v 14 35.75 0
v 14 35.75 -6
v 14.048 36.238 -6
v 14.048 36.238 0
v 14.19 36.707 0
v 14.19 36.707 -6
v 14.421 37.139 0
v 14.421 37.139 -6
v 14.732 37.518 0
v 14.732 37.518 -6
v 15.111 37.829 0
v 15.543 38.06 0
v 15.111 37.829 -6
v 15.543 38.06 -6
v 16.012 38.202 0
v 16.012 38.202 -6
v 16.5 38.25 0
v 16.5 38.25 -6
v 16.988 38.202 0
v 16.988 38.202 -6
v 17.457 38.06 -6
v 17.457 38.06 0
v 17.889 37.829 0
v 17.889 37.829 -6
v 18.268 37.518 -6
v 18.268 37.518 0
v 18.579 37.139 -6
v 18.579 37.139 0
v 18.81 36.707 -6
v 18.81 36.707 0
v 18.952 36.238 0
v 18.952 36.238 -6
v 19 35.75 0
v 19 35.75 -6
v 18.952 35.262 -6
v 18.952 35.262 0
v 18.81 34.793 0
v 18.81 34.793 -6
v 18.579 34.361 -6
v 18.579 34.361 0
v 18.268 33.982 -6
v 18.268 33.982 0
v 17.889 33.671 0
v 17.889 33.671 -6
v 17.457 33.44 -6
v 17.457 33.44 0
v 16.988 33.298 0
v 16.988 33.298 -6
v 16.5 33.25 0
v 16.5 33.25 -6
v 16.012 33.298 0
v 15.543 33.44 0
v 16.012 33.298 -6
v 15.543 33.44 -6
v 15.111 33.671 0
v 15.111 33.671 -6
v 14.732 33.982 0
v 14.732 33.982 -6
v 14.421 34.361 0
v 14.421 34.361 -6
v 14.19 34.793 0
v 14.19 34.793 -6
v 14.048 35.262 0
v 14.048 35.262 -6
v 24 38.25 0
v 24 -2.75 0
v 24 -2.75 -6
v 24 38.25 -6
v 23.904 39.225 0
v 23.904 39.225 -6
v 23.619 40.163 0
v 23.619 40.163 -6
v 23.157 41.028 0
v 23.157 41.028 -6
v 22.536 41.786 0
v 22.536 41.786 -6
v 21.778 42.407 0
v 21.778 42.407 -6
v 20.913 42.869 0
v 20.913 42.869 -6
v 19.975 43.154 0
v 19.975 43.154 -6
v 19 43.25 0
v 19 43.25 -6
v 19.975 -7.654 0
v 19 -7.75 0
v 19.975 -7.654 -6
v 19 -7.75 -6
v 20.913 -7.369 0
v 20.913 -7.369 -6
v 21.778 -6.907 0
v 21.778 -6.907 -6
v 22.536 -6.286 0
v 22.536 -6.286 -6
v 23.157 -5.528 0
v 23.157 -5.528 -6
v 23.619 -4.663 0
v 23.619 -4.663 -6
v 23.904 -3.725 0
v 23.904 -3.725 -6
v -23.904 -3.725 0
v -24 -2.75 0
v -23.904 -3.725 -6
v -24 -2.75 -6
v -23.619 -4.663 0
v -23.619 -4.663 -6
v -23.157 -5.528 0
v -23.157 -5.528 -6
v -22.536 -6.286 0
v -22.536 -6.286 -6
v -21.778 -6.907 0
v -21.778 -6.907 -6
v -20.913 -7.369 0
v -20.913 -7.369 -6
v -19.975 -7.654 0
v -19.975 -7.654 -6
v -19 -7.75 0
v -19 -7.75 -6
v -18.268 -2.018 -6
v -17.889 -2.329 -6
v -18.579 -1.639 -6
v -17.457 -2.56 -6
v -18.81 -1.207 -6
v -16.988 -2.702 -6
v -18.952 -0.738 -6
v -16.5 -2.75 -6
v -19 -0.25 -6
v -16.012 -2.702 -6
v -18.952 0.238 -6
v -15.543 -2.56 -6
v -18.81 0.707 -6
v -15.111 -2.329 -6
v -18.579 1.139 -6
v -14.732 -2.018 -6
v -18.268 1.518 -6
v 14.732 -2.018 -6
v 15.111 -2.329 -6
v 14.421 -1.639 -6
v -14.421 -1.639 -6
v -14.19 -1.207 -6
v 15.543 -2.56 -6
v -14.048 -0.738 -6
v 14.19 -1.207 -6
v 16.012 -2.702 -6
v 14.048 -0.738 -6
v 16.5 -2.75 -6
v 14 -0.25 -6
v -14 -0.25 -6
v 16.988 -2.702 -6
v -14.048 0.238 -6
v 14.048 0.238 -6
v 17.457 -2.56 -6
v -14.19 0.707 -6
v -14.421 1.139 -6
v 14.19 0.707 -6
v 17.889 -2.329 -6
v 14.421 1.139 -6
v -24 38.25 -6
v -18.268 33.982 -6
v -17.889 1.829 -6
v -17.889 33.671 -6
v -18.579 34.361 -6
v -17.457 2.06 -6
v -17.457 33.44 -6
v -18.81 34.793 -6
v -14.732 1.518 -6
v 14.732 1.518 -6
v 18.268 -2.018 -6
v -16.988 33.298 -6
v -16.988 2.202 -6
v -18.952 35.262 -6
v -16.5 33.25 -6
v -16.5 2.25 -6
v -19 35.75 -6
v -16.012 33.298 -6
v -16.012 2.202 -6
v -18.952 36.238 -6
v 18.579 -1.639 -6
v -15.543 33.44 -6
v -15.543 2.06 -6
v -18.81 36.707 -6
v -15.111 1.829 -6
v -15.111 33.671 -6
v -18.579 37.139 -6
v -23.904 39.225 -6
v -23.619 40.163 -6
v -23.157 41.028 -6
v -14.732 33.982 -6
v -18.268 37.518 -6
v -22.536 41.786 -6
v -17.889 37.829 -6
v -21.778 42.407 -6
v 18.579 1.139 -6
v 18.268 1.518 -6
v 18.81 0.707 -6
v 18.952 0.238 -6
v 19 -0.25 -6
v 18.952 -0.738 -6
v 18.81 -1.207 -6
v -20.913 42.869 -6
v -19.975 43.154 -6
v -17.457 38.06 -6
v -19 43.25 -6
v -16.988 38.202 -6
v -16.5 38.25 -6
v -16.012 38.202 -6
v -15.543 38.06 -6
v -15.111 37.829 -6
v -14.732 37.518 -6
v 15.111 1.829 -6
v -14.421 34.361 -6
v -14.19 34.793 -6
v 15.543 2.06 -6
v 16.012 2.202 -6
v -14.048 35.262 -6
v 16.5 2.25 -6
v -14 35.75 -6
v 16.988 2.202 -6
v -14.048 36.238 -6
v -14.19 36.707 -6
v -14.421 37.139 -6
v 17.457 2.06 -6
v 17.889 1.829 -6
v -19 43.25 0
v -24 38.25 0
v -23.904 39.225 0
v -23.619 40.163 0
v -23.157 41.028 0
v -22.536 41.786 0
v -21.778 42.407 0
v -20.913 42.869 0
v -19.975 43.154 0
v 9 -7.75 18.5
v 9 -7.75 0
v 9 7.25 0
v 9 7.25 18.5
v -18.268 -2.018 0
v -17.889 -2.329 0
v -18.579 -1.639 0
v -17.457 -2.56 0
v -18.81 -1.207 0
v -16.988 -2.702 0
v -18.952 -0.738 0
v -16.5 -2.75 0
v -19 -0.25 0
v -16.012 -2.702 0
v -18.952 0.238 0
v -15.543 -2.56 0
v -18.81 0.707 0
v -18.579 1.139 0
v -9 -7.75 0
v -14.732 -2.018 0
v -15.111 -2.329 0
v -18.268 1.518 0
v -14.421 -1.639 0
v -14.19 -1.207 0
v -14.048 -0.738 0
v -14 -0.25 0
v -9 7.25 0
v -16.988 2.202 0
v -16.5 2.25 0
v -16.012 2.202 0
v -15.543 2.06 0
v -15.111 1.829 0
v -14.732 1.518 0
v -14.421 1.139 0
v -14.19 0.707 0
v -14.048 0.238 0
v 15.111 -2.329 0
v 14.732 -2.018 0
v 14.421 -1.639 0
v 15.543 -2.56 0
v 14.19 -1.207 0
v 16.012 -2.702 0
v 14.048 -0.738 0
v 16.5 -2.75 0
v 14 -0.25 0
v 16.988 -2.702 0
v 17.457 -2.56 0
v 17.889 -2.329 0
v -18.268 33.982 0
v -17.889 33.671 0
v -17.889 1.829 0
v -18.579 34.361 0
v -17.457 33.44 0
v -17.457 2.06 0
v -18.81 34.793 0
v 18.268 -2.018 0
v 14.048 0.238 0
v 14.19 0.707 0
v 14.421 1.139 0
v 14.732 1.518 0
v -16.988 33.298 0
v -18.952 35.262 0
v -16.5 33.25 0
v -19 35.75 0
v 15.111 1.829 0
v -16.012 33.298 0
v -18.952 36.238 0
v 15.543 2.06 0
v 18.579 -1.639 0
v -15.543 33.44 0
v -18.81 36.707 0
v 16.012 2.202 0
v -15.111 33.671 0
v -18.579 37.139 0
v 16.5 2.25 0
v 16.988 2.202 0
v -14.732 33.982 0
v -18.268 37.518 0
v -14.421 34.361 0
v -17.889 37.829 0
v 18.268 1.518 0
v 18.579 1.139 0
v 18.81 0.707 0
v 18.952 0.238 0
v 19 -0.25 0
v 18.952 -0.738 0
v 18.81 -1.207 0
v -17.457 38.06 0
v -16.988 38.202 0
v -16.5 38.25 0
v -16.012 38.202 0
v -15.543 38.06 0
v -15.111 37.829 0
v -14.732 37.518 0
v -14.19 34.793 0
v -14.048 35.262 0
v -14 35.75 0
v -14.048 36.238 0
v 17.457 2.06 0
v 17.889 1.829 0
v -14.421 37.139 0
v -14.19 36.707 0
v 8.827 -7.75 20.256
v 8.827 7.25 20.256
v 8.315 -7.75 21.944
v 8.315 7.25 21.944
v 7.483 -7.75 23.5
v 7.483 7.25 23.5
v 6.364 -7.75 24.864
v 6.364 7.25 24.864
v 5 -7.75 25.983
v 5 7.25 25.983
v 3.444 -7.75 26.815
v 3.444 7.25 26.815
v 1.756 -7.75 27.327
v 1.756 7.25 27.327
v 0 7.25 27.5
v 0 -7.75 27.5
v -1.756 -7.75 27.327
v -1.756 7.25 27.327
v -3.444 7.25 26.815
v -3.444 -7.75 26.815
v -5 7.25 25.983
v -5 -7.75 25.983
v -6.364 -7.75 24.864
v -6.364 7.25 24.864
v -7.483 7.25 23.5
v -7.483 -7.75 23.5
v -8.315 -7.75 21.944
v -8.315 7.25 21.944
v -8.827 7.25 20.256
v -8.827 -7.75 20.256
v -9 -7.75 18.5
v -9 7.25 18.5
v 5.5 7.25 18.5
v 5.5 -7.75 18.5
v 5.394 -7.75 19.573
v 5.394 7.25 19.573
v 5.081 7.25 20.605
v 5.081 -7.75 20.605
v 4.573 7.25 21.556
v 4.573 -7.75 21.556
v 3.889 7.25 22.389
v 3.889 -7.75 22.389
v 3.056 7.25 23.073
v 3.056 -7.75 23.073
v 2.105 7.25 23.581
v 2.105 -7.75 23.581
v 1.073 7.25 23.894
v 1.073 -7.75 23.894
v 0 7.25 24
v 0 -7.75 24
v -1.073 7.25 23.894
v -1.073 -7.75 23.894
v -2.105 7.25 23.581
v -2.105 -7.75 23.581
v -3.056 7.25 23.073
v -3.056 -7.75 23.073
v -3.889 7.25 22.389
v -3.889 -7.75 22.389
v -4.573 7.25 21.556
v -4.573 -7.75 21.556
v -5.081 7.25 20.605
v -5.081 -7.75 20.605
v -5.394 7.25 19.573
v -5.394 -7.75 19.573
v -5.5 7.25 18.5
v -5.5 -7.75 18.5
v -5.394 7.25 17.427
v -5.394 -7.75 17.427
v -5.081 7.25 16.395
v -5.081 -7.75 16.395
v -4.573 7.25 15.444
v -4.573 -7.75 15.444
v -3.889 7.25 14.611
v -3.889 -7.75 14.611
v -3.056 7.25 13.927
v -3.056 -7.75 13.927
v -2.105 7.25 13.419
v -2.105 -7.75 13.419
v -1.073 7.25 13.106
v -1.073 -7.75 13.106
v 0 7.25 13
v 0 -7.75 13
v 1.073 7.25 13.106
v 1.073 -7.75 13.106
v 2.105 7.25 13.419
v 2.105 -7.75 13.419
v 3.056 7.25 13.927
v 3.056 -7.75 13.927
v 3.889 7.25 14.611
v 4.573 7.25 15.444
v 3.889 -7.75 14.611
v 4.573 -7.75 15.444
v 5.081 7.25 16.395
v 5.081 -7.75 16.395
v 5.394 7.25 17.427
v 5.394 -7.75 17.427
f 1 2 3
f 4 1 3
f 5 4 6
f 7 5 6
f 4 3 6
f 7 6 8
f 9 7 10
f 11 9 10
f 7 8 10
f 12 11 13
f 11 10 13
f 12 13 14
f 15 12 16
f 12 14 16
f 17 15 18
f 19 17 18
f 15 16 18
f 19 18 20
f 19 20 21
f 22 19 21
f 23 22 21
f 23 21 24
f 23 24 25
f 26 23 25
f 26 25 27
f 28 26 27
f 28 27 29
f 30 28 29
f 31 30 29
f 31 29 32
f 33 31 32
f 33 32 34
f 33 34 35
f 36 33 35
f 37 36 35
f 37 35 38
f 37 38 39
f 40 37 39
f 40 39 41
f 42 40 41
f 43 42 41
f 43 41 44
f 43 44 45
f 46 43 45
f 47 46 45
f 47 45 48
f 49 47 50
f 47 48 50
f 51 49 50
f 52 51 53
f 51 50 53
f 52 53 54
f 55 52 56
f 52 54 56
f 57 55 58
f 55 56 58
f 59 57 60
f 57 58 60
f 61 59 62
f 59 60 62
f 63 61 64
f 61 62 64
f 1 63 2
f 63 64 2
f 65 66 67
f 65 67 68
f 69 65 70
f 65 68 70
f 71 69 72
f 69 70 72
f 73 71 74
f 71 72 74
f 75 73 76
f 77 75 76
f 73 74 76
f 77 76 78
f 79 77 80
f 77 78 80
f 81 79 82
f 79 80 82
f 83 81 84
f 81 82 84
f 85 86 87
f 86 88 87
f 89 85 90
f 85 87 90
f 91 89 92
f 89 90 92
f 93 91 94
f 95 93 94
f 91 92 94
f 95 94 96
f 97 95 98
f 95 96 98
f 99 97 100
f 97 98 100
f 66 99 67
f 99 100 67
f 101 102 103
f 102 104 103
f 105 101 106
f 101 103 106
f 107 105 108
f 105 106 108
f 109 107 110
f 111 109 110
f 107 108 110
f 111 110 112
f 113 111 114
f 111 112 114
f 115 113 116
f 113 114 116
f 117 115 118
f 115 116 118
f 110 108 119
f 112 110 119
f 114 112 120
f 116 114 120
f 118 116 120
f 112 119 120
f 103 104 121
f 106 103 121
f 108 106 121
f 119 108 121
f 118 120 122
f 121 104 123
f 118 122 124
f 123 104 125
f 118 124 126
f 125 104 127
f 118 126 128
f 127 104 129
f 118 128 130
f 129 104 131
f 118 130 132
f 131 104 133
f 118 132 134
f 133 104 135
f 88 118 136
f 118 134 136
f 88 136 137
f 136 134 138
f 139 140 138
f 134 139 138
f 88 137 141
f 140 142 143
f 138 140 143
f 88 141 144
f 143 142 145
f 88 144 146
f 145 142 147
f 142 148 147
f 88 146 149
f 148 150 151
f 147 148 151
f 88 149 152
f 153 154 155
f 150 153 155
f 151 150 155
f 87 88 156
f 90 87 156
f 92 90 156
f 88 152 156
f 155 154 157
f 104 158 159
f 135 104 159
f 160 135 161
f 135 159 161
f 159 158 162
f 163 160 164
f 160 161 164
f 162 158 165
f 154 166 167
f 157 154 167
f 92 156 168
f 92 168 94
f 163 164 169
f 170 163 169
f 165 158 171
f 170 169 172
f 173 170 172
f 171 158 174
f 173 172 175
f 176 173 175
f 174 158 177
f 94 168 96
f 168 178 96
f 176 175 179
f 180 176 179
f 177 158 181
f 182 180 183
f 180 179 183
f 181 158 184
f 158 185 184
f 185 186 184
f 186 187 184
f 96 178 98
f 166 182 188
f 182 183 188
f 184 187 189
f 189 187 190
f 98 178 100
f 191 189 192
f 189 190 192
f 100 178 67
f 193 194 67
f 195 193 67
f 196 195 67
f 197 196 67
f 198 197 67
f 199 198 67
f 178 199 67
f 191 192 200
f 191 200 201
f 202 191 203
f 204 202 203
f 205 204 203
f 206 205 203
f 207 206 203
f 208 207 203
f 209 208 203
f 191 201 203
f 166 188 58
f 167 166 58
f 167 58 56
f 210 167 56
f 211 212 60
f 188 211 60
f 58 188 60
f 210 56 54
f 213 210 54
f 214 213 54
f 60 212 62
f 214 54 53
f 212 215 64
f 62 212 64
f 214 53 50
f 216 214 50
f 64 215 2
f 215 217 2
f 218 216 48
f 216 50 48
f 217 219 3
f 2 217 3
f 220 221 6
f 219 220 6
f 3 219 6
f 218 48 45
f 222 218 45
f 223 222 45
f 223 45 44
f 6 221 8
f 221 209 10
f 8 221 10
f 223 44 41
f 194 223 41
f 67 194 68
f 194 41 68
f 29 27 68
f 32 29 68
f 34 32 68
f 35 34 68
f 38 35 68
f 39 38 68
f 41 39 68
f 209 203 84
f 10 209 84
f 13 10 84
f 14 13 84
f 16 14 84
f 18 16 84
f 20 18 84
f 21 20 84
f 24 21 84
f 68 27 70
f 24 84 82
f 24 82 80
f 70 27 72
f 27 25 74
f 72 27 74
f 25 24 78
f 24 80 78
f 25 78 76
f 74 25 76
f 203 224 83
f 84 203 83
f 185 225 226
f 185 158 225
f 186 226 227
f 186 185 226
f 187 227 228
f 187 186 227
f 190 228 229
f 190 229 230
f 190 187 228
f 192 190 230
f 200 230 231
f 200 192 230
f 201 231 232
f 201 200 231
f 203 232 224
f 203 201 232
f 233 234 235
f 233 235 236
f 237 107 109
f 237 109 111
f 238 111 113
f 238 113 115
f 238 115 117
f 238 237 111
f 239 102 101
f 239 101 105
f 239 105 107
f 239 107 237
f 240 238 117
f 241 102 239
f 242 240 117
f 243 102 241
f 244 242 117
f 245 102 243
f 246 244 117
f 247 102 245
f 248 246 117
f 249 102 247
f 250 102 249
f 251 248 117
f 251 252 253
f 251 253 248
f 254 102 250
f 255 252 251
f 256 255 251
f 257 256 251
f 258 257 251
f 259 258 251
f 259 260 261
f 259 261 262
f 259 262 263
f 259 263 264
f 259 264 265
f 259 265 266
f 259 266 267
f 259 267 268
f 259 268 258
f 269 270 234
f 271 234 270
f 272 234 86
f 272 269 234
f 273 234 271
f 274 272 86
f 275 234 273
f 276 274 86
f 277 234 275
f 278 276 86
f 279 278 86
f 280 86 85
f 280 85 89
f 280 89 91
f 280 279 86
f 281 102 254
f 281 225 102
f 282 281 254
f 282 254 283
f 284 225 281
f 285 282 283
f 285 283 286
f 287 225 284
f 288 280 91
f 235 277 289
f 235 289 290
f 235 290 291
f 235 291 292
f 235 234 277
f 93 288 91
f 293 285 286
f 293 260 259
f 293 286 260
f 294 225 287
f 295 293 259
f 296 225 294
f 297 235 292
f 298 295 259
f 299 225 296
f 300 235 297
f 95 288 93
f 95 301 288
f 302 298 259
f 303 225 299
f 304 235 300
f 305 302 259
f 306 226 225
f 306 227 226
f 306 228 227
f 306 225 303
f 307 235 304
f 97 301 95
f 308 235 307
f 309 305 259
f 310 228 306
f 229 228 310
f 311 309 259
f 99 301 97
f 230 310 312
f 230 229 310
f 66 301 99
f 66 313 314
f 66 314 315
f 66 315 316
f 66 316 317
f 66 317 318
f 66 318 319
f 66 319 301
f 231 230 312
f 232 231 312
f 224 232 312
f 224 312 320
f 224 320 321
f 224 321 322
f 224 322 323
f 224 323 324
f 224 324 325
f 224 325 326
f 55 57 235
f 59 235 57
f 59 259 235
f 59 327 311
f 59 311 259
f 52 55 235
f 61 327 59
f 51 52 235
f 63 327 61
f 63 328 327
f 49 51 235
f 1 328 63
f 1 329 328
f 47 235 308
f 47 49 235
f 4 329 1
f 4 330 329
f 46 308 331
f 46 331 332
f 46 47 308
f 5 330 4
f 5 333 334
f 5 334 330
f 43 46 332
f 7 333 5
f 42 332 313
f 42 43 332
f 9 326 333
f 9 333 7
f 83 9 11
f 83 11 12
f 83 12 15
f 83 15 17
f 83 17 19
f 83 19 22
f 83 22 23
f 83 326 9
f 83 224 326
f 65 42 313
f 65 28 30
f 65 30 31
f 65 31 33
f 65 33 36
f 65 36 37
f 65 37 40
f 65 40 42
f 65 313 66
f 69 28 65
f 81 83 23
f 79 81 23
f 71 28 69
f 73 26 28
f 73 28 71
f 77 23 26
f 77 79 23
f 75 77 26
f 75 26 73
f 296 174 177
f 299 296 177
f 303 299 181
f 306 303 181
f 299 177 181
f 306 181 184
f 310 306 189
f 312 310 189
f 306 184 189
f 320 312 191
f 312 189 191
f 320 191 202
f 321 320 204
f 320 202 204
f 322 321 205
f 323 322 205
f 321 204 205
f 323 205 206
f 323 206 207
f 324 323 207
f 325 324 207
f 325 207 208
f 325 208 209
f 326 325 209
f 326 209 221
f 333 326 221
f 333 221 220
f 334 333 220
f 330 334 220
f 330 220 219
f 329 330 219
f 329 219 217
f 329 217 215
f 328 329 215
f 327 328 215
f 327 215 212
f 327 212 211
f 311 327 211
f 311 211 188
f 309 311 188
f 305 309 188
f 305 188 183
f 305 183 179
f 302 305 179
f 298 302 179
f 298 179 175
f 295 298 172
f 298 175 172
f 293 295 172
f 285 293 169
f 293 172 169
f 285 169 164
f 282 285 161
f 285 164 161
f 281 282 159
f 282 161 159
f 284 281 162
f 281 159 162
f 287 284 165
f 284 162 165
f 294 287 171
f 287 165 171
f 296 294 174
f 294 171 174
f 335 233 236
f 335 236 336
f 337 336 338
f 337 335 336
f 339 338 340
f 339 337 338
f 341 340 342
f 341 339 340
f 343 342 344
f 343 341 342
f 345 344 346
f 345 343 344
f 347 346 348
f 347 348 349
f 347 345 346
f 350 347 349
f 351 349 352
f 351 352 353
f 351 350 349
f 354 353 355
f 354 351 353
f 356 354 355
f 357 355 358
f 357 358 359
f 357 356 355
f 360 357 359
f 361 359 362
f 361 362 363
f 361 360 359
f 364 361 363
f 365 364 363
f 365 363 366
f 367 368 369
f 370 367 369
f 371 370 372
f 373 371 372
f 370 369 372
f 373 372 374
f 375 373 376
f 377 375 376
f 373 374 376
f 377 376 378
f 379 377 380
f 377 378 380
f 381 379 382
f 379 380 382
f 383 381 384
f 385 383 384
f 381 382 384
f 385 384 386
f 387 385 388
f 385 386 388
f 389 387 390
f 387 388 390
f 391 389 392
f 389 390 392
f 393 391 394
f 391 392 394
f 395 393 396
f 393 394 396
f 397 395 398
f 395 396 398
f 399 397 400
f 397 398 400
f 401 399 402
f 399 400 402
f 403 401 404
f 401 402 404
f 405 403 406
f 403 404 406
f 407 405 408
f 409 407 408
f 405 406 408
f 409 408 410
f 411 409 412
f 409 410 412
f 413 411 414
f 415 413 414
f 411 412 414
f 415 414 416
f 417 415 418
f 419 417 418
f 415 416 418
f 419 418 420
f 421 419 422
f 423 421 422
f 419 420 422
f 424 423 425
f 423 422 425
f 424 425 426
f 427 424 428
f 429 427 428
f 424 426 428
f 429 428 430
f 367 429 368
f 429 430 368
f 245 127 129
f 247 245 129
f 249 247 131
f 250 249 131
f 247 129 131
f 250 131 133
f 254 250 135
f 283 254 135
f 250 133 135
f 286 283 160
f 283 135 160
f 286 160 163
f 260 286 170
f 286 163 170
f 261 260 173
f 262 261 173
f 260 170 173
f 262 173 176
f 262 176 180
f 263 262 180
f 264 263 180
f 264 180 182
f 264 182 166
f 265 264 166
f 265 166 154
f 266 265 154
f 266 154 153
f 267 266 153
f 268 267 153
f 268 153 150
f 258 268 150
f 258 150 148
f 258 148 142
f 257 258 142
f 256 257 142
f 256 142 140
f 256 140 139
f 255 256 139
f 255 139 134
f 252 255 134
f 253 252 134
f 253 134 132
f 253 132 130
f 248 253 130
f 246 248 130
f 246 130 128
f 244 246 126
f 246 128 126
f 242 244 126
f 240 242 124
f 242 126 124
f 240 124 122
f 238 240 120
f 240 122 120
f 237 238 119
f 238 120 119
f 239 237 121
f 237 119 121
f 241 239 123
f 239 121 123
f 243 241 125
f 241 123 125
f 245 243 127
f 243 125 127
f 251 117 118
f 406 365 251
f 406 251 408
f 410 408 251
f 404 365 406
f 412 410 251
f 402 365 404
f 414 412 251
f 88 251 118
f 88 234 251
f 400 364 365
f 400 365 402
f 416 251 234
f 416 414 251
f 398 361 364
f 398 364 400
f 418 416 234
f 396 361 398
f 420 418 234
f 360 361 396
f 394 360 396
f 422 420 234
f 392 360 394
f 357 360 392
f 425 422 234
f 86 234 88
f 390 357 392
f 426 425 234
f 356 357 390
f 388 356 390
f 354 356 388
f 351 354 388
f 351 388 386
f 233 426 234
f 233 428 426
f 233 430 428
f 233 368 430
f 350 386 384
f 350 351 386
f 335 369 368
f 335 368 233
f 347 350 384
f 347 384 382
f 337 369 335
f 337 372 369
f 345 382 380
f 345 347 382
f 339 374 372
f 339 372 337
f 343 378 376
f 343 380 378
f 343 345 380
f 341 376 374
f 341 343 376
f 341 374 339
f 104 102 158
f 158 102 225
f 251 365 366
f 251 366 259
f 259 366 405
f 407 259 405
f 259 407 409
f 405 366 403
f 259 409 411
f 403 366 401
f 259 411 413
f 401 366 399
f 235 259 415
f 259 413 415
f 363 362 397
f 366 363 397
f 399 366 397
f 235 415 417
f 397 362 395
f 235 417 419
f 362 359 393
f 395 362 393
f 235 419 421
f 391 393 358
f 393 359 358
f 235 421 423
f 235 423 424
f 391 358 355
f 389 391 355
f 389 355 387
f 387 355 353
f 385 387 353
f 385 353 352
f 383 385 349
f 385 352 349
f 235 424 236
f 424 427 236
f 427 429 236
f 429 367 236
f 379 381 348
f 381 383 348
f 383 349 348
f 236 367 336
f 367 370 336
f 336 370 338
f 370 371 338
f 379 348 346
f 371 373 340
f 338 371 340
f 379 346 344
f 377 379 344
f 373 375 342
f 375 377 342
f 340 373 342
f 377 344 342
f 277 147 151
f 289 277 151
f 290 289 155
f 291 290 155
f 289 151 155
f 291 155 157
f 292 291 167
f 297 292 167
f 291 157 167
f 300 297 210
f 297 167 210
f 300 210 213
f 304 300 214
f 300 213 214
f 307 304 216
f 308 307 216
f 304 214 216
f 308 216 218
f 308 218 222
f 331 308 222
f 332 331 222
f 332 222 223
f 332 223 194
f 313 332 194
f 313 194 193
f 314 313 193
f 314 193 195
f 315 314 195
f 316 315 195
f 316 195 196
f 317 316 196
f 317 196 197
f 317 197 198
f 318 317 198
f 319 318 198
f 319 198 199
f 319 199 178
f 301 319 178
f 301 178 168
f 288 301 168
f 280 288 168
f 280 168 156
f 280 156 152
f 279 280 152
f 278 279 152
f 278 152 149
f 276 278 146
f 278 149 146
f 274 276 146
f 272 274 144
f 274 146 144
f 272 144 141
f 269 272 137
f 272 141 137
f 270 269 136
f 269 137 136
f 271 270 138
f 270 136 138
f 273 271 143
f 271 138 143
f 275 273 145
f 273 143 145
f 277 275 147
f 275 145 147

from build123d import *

# Parameters (mm, degrees)
F0_W     = 48
F0_H     = 51
F1_DEPTH = 6
F2_R     = 5
F3_D     = 5
F4_R     = 5.5
F5_DEPTH = 15


with BuildPart() as f1:
    # F0 (on Top) → F1 (new body)
    with BuildSketch(Plane.XY):
        with Locations((0, 17.75)):
            Rectangle(F0_W, F0_H)
    extrude(amount=-F1_DEPTH)

    # F2
    f2_edges = [f1.edges().sort_by_distance(p)[0] for p in [
        (24, -7.75, -3),
        (24, 43.25, -3),
        (-24, 43.25, -3),
        (-24, -7.75, -3),
    ]]
    fillet(f2_edges, radius=F2_R)

    # F3 (through all)
    with Locations(Plane.XY):
        with Locations((16.5, -0.25), (-16.5, -0.25), (16.5, 35.75), (-16.5, 35.75)):
            Hole(F3_D / 2)

    # F4 (on face) → F5 (join)
    with BuildSketch(Plane.XZ.offset(7.75)):
        with BuildLine():
            Line((9, 0), (9, 18.5))
            ThreePointArc((9, 18.5), (0, 27.5), (-9, 18.5))
            Line((-9, 18.5), (-9, 0))
            Line((-9, 0), (9, 0))
        make_face()
        with Locations((0, 18.5)):
            Circle(F4_R, mode=Mode.SUBTRACT)
    extrude(amount=-F5_DEPTH)


solid = f1.part
